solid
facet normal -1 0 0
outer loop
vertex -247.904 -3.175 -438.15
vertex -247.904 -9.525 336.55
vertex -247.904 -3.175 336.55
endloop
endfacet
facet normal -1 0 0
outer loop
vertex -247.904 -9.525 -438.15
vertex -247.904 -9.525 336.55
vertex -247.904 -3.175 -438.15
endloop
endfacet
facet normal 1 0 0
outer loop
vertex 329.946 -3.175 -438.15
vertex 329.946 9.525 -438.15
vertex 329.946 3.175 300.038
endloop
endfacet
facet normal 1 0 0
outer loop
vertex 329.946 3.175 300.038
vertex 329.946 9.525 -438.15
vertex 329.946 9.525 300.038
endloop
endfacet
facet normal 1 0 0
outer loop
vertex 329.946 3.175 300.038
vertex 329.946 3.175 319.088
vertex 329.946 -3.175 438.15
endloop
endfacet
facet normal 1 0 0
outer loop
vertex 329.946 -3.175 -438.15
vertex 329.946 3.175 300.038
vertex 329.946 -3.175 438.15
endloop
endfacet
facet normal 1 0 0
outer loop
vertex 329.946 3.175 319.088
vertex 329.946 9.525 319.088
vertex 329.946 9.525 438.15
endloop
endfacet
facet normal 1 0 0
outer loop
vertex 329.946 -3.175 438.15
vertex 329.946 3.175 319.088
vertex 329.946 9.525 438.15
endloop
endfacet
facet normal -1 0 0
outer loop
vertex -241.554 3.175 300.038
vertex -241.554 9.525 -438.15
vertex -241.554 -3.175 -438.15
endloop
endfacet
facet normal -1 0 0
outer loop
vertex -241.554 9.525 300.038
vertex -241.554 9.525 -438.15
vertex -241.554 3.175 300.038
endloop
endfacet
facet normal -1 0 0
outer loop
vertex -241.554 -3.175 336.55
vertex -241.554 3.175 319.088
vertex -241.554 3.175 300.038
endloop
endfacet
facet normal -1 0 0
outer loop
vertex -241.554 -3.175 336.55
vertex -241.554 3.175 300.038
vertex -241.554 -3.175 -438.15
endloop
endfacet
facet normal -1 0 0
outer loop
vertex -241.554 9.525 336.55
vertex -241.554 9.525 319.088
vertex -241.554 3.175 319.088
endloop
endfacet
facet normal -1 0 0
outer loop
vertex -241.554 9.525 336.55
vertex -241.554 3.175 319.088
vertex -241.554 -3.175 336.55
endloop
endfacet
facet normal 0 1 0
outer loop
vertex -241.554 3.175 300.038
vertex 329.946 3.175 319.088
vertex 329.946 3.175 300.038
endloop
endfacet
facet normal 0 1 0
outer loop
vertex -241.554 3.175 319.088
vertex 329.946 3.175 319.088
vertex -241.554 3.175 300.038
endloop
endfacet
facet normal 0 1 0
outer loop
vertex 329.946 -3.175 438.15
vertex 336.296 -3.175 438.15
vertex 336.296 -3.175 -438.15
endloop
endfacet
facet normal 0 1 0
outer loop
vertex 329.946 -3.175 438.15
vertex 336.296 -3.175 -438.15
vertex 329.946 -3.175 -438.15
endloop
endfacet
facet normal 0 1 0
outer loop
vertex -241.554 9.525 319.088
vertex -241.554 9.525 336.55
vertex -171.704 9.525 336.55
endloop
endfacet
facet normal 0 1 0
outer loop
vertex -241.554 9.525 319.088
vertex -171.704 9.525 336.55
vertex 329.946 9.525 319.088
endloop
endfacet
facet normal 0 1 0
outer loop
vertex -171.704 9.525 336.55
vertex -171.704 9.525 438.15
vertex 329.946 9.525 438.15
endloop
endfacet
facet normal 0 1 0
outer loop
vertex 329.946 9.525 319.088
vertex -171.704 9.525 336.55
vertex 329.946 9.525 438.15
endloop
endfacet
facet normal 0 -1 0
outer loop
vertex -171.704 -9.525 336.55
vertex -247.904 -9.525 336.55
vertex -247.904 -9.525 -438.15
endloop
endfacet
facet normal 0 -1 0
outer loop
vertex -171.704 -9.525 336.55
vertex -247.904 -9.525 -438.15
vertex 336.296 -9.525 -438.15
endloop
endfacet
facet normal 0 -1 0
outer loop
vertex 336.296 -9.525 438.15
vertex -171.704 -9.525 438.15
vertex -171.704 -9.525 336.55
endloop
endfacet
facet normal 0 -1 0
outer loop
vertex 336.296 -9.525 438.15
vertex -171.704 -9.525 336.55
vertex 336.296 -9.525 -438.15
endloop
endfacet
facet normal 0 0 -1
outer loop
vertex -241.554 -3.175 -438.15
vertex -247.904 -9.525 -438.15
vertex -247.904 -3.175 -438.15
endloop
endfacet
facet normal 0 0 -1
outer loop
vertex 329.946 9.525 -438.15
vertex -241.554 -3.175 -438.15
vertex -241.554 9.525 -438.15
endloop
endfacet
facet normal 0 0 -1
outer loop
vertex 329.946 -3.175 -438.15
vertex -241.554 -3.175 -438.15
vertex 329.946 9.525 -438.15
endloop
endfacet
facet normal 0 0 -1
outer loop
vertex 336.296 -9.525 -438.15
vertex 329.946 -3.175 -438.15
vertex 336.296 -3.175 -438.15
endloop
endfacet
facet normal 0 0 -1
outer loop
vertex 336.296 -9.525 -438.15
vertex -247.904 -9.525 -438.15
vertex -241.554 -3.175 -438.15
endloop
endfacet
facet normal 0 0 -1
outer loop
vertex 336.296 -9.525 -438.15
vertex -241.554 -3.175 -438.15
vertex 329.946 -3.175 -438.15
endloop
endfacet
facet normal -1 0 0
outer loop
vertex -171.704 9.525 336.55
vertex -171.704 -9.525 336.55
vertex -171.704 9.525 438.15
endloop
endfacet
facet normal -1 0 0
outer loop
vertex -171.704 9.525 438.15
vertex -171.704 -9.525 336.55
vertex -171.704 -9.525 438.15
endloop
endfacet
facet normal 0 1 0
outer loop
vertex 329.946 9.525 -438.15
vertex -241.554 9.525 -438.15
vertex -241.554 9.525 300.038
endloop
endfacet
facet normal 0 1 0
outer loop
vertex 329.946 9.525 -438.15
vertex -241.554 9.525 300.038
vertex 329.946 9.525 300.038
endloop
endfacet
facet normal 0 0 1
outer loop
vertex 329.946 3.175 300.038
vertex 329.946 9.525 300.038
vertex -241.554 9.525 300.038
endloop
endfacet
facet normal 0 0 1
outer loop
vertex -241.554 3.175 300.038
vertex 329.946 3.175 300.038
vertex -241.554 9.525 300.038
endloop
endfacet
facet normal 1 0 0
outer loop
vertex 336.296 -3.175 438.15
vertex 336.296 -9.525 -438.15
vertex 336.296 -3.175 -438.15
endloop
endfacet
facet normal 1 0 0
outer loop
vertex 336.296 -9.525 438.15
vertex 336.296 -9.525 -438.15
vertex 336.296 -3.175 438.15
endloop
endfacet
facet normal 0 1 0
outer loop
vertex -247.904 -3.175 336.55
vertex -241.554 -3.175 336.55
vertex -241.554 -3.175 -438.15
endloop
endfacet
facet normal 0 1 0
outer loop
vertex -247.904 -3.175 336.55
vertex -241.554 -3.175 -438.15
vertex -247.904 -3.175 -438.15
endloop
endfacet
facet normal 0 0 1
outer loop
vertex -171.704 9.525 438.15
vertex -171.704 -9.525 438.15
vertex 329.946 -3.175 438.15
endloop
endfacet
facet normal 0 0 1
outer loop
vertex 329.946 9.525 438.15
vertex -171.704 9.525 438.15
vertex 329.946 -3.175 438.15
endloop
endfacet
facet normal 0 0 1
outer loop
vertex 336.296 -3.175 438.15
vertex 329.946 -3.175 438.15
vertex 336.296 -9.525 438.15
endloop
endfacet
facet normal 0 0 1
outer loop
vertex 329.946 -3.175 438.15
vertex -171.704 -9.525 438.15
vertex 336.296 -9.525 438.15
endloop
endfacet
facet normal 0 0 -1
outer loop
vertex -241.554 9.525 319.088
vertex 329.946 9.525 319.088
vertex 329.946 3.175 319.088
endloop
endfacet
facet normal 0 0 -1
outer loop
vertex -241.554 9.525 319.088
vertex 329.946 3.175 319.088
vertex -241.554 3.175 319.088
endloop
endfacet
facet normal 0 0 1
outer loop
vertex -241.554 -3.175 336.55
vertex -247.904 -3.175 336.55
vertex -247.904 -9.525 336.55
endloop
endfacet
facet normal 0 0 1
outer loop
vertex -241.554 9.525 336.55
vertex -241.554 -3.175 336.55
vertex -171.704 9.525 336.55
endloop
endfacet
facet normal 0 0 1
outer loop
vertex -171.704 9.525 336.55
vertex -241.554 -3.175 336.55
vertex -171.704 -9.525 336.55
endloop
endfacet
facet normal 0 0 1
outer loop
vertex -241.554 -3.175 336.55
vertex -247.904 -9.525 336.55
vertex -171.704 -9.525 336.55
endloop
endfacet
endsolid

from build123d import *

# Parameters (mm, degrees)
F0_W     = 584.2
F0_H     = 438.15
F1_DEPTH = 9.525
F2_W     = 6.35
F2_H     = 876.3
F3_DEPTH = 12.7
F4_W     = 584.2
F4_H     = 19.05
F5_DEPTH = 6.35
F6_W     = 76.2
F6_H     = 101.6
F7_DEPTH = 19.051


with BuildPart() as f1:
    # F0 (on Front) → F1 (new body, symmetric)
    with BuildSketch(Plane.XZ):
        with Locations((44.1960046741, 219.075)):
            Rectangle(F0_W, F0_H)
        with Locations((44.1960046741, -219.075)):
            Rectangle(F0_W, F0_H)
    extrude(amount=F1_DEPTH, both=True)

    # F2 (on face) → F3 (cut)
    with BuildSketch(Plane(origin=(0, 9.525, 0), x_dir=(-1, 0, 0), z_dir=(0, 1, 0))):
        with Locations((-333.1210046741, 0)):
            Rectangle(F2_W, F2_H)
        with Locations((244.7289953259, 0)):
            Rectangle(F2_W, F2_H)
    extrude(amount=-F3_DEPTH, mode=Mode.SUBTRACT)

    # F4 (on face) → F5 (cut)
    with BuildSketch(Plane(origin=(0, 9.525, 0), x_dir=(-1, 0, 0), z_dir=(0, 1, 0))):
        with Locations((-44.1960046741, 309.5625)):
            Rectangle(F4_W, F4_H)
    extrude(amount=-F5_DEPTH, mode=Mode.SUBTRACT)

    # F6 (on face) → F7 (cut, through all)
    with BuildSketch(Plane.XZ.offset(9.525)):
        with Locations((-209.8039953259, 387.35)):
            Rectangle(F6_W, F6_H)
    extrude(amount=-F7_DEPTH, mode=Mode.SUBTRACT)


solid = f1.part
